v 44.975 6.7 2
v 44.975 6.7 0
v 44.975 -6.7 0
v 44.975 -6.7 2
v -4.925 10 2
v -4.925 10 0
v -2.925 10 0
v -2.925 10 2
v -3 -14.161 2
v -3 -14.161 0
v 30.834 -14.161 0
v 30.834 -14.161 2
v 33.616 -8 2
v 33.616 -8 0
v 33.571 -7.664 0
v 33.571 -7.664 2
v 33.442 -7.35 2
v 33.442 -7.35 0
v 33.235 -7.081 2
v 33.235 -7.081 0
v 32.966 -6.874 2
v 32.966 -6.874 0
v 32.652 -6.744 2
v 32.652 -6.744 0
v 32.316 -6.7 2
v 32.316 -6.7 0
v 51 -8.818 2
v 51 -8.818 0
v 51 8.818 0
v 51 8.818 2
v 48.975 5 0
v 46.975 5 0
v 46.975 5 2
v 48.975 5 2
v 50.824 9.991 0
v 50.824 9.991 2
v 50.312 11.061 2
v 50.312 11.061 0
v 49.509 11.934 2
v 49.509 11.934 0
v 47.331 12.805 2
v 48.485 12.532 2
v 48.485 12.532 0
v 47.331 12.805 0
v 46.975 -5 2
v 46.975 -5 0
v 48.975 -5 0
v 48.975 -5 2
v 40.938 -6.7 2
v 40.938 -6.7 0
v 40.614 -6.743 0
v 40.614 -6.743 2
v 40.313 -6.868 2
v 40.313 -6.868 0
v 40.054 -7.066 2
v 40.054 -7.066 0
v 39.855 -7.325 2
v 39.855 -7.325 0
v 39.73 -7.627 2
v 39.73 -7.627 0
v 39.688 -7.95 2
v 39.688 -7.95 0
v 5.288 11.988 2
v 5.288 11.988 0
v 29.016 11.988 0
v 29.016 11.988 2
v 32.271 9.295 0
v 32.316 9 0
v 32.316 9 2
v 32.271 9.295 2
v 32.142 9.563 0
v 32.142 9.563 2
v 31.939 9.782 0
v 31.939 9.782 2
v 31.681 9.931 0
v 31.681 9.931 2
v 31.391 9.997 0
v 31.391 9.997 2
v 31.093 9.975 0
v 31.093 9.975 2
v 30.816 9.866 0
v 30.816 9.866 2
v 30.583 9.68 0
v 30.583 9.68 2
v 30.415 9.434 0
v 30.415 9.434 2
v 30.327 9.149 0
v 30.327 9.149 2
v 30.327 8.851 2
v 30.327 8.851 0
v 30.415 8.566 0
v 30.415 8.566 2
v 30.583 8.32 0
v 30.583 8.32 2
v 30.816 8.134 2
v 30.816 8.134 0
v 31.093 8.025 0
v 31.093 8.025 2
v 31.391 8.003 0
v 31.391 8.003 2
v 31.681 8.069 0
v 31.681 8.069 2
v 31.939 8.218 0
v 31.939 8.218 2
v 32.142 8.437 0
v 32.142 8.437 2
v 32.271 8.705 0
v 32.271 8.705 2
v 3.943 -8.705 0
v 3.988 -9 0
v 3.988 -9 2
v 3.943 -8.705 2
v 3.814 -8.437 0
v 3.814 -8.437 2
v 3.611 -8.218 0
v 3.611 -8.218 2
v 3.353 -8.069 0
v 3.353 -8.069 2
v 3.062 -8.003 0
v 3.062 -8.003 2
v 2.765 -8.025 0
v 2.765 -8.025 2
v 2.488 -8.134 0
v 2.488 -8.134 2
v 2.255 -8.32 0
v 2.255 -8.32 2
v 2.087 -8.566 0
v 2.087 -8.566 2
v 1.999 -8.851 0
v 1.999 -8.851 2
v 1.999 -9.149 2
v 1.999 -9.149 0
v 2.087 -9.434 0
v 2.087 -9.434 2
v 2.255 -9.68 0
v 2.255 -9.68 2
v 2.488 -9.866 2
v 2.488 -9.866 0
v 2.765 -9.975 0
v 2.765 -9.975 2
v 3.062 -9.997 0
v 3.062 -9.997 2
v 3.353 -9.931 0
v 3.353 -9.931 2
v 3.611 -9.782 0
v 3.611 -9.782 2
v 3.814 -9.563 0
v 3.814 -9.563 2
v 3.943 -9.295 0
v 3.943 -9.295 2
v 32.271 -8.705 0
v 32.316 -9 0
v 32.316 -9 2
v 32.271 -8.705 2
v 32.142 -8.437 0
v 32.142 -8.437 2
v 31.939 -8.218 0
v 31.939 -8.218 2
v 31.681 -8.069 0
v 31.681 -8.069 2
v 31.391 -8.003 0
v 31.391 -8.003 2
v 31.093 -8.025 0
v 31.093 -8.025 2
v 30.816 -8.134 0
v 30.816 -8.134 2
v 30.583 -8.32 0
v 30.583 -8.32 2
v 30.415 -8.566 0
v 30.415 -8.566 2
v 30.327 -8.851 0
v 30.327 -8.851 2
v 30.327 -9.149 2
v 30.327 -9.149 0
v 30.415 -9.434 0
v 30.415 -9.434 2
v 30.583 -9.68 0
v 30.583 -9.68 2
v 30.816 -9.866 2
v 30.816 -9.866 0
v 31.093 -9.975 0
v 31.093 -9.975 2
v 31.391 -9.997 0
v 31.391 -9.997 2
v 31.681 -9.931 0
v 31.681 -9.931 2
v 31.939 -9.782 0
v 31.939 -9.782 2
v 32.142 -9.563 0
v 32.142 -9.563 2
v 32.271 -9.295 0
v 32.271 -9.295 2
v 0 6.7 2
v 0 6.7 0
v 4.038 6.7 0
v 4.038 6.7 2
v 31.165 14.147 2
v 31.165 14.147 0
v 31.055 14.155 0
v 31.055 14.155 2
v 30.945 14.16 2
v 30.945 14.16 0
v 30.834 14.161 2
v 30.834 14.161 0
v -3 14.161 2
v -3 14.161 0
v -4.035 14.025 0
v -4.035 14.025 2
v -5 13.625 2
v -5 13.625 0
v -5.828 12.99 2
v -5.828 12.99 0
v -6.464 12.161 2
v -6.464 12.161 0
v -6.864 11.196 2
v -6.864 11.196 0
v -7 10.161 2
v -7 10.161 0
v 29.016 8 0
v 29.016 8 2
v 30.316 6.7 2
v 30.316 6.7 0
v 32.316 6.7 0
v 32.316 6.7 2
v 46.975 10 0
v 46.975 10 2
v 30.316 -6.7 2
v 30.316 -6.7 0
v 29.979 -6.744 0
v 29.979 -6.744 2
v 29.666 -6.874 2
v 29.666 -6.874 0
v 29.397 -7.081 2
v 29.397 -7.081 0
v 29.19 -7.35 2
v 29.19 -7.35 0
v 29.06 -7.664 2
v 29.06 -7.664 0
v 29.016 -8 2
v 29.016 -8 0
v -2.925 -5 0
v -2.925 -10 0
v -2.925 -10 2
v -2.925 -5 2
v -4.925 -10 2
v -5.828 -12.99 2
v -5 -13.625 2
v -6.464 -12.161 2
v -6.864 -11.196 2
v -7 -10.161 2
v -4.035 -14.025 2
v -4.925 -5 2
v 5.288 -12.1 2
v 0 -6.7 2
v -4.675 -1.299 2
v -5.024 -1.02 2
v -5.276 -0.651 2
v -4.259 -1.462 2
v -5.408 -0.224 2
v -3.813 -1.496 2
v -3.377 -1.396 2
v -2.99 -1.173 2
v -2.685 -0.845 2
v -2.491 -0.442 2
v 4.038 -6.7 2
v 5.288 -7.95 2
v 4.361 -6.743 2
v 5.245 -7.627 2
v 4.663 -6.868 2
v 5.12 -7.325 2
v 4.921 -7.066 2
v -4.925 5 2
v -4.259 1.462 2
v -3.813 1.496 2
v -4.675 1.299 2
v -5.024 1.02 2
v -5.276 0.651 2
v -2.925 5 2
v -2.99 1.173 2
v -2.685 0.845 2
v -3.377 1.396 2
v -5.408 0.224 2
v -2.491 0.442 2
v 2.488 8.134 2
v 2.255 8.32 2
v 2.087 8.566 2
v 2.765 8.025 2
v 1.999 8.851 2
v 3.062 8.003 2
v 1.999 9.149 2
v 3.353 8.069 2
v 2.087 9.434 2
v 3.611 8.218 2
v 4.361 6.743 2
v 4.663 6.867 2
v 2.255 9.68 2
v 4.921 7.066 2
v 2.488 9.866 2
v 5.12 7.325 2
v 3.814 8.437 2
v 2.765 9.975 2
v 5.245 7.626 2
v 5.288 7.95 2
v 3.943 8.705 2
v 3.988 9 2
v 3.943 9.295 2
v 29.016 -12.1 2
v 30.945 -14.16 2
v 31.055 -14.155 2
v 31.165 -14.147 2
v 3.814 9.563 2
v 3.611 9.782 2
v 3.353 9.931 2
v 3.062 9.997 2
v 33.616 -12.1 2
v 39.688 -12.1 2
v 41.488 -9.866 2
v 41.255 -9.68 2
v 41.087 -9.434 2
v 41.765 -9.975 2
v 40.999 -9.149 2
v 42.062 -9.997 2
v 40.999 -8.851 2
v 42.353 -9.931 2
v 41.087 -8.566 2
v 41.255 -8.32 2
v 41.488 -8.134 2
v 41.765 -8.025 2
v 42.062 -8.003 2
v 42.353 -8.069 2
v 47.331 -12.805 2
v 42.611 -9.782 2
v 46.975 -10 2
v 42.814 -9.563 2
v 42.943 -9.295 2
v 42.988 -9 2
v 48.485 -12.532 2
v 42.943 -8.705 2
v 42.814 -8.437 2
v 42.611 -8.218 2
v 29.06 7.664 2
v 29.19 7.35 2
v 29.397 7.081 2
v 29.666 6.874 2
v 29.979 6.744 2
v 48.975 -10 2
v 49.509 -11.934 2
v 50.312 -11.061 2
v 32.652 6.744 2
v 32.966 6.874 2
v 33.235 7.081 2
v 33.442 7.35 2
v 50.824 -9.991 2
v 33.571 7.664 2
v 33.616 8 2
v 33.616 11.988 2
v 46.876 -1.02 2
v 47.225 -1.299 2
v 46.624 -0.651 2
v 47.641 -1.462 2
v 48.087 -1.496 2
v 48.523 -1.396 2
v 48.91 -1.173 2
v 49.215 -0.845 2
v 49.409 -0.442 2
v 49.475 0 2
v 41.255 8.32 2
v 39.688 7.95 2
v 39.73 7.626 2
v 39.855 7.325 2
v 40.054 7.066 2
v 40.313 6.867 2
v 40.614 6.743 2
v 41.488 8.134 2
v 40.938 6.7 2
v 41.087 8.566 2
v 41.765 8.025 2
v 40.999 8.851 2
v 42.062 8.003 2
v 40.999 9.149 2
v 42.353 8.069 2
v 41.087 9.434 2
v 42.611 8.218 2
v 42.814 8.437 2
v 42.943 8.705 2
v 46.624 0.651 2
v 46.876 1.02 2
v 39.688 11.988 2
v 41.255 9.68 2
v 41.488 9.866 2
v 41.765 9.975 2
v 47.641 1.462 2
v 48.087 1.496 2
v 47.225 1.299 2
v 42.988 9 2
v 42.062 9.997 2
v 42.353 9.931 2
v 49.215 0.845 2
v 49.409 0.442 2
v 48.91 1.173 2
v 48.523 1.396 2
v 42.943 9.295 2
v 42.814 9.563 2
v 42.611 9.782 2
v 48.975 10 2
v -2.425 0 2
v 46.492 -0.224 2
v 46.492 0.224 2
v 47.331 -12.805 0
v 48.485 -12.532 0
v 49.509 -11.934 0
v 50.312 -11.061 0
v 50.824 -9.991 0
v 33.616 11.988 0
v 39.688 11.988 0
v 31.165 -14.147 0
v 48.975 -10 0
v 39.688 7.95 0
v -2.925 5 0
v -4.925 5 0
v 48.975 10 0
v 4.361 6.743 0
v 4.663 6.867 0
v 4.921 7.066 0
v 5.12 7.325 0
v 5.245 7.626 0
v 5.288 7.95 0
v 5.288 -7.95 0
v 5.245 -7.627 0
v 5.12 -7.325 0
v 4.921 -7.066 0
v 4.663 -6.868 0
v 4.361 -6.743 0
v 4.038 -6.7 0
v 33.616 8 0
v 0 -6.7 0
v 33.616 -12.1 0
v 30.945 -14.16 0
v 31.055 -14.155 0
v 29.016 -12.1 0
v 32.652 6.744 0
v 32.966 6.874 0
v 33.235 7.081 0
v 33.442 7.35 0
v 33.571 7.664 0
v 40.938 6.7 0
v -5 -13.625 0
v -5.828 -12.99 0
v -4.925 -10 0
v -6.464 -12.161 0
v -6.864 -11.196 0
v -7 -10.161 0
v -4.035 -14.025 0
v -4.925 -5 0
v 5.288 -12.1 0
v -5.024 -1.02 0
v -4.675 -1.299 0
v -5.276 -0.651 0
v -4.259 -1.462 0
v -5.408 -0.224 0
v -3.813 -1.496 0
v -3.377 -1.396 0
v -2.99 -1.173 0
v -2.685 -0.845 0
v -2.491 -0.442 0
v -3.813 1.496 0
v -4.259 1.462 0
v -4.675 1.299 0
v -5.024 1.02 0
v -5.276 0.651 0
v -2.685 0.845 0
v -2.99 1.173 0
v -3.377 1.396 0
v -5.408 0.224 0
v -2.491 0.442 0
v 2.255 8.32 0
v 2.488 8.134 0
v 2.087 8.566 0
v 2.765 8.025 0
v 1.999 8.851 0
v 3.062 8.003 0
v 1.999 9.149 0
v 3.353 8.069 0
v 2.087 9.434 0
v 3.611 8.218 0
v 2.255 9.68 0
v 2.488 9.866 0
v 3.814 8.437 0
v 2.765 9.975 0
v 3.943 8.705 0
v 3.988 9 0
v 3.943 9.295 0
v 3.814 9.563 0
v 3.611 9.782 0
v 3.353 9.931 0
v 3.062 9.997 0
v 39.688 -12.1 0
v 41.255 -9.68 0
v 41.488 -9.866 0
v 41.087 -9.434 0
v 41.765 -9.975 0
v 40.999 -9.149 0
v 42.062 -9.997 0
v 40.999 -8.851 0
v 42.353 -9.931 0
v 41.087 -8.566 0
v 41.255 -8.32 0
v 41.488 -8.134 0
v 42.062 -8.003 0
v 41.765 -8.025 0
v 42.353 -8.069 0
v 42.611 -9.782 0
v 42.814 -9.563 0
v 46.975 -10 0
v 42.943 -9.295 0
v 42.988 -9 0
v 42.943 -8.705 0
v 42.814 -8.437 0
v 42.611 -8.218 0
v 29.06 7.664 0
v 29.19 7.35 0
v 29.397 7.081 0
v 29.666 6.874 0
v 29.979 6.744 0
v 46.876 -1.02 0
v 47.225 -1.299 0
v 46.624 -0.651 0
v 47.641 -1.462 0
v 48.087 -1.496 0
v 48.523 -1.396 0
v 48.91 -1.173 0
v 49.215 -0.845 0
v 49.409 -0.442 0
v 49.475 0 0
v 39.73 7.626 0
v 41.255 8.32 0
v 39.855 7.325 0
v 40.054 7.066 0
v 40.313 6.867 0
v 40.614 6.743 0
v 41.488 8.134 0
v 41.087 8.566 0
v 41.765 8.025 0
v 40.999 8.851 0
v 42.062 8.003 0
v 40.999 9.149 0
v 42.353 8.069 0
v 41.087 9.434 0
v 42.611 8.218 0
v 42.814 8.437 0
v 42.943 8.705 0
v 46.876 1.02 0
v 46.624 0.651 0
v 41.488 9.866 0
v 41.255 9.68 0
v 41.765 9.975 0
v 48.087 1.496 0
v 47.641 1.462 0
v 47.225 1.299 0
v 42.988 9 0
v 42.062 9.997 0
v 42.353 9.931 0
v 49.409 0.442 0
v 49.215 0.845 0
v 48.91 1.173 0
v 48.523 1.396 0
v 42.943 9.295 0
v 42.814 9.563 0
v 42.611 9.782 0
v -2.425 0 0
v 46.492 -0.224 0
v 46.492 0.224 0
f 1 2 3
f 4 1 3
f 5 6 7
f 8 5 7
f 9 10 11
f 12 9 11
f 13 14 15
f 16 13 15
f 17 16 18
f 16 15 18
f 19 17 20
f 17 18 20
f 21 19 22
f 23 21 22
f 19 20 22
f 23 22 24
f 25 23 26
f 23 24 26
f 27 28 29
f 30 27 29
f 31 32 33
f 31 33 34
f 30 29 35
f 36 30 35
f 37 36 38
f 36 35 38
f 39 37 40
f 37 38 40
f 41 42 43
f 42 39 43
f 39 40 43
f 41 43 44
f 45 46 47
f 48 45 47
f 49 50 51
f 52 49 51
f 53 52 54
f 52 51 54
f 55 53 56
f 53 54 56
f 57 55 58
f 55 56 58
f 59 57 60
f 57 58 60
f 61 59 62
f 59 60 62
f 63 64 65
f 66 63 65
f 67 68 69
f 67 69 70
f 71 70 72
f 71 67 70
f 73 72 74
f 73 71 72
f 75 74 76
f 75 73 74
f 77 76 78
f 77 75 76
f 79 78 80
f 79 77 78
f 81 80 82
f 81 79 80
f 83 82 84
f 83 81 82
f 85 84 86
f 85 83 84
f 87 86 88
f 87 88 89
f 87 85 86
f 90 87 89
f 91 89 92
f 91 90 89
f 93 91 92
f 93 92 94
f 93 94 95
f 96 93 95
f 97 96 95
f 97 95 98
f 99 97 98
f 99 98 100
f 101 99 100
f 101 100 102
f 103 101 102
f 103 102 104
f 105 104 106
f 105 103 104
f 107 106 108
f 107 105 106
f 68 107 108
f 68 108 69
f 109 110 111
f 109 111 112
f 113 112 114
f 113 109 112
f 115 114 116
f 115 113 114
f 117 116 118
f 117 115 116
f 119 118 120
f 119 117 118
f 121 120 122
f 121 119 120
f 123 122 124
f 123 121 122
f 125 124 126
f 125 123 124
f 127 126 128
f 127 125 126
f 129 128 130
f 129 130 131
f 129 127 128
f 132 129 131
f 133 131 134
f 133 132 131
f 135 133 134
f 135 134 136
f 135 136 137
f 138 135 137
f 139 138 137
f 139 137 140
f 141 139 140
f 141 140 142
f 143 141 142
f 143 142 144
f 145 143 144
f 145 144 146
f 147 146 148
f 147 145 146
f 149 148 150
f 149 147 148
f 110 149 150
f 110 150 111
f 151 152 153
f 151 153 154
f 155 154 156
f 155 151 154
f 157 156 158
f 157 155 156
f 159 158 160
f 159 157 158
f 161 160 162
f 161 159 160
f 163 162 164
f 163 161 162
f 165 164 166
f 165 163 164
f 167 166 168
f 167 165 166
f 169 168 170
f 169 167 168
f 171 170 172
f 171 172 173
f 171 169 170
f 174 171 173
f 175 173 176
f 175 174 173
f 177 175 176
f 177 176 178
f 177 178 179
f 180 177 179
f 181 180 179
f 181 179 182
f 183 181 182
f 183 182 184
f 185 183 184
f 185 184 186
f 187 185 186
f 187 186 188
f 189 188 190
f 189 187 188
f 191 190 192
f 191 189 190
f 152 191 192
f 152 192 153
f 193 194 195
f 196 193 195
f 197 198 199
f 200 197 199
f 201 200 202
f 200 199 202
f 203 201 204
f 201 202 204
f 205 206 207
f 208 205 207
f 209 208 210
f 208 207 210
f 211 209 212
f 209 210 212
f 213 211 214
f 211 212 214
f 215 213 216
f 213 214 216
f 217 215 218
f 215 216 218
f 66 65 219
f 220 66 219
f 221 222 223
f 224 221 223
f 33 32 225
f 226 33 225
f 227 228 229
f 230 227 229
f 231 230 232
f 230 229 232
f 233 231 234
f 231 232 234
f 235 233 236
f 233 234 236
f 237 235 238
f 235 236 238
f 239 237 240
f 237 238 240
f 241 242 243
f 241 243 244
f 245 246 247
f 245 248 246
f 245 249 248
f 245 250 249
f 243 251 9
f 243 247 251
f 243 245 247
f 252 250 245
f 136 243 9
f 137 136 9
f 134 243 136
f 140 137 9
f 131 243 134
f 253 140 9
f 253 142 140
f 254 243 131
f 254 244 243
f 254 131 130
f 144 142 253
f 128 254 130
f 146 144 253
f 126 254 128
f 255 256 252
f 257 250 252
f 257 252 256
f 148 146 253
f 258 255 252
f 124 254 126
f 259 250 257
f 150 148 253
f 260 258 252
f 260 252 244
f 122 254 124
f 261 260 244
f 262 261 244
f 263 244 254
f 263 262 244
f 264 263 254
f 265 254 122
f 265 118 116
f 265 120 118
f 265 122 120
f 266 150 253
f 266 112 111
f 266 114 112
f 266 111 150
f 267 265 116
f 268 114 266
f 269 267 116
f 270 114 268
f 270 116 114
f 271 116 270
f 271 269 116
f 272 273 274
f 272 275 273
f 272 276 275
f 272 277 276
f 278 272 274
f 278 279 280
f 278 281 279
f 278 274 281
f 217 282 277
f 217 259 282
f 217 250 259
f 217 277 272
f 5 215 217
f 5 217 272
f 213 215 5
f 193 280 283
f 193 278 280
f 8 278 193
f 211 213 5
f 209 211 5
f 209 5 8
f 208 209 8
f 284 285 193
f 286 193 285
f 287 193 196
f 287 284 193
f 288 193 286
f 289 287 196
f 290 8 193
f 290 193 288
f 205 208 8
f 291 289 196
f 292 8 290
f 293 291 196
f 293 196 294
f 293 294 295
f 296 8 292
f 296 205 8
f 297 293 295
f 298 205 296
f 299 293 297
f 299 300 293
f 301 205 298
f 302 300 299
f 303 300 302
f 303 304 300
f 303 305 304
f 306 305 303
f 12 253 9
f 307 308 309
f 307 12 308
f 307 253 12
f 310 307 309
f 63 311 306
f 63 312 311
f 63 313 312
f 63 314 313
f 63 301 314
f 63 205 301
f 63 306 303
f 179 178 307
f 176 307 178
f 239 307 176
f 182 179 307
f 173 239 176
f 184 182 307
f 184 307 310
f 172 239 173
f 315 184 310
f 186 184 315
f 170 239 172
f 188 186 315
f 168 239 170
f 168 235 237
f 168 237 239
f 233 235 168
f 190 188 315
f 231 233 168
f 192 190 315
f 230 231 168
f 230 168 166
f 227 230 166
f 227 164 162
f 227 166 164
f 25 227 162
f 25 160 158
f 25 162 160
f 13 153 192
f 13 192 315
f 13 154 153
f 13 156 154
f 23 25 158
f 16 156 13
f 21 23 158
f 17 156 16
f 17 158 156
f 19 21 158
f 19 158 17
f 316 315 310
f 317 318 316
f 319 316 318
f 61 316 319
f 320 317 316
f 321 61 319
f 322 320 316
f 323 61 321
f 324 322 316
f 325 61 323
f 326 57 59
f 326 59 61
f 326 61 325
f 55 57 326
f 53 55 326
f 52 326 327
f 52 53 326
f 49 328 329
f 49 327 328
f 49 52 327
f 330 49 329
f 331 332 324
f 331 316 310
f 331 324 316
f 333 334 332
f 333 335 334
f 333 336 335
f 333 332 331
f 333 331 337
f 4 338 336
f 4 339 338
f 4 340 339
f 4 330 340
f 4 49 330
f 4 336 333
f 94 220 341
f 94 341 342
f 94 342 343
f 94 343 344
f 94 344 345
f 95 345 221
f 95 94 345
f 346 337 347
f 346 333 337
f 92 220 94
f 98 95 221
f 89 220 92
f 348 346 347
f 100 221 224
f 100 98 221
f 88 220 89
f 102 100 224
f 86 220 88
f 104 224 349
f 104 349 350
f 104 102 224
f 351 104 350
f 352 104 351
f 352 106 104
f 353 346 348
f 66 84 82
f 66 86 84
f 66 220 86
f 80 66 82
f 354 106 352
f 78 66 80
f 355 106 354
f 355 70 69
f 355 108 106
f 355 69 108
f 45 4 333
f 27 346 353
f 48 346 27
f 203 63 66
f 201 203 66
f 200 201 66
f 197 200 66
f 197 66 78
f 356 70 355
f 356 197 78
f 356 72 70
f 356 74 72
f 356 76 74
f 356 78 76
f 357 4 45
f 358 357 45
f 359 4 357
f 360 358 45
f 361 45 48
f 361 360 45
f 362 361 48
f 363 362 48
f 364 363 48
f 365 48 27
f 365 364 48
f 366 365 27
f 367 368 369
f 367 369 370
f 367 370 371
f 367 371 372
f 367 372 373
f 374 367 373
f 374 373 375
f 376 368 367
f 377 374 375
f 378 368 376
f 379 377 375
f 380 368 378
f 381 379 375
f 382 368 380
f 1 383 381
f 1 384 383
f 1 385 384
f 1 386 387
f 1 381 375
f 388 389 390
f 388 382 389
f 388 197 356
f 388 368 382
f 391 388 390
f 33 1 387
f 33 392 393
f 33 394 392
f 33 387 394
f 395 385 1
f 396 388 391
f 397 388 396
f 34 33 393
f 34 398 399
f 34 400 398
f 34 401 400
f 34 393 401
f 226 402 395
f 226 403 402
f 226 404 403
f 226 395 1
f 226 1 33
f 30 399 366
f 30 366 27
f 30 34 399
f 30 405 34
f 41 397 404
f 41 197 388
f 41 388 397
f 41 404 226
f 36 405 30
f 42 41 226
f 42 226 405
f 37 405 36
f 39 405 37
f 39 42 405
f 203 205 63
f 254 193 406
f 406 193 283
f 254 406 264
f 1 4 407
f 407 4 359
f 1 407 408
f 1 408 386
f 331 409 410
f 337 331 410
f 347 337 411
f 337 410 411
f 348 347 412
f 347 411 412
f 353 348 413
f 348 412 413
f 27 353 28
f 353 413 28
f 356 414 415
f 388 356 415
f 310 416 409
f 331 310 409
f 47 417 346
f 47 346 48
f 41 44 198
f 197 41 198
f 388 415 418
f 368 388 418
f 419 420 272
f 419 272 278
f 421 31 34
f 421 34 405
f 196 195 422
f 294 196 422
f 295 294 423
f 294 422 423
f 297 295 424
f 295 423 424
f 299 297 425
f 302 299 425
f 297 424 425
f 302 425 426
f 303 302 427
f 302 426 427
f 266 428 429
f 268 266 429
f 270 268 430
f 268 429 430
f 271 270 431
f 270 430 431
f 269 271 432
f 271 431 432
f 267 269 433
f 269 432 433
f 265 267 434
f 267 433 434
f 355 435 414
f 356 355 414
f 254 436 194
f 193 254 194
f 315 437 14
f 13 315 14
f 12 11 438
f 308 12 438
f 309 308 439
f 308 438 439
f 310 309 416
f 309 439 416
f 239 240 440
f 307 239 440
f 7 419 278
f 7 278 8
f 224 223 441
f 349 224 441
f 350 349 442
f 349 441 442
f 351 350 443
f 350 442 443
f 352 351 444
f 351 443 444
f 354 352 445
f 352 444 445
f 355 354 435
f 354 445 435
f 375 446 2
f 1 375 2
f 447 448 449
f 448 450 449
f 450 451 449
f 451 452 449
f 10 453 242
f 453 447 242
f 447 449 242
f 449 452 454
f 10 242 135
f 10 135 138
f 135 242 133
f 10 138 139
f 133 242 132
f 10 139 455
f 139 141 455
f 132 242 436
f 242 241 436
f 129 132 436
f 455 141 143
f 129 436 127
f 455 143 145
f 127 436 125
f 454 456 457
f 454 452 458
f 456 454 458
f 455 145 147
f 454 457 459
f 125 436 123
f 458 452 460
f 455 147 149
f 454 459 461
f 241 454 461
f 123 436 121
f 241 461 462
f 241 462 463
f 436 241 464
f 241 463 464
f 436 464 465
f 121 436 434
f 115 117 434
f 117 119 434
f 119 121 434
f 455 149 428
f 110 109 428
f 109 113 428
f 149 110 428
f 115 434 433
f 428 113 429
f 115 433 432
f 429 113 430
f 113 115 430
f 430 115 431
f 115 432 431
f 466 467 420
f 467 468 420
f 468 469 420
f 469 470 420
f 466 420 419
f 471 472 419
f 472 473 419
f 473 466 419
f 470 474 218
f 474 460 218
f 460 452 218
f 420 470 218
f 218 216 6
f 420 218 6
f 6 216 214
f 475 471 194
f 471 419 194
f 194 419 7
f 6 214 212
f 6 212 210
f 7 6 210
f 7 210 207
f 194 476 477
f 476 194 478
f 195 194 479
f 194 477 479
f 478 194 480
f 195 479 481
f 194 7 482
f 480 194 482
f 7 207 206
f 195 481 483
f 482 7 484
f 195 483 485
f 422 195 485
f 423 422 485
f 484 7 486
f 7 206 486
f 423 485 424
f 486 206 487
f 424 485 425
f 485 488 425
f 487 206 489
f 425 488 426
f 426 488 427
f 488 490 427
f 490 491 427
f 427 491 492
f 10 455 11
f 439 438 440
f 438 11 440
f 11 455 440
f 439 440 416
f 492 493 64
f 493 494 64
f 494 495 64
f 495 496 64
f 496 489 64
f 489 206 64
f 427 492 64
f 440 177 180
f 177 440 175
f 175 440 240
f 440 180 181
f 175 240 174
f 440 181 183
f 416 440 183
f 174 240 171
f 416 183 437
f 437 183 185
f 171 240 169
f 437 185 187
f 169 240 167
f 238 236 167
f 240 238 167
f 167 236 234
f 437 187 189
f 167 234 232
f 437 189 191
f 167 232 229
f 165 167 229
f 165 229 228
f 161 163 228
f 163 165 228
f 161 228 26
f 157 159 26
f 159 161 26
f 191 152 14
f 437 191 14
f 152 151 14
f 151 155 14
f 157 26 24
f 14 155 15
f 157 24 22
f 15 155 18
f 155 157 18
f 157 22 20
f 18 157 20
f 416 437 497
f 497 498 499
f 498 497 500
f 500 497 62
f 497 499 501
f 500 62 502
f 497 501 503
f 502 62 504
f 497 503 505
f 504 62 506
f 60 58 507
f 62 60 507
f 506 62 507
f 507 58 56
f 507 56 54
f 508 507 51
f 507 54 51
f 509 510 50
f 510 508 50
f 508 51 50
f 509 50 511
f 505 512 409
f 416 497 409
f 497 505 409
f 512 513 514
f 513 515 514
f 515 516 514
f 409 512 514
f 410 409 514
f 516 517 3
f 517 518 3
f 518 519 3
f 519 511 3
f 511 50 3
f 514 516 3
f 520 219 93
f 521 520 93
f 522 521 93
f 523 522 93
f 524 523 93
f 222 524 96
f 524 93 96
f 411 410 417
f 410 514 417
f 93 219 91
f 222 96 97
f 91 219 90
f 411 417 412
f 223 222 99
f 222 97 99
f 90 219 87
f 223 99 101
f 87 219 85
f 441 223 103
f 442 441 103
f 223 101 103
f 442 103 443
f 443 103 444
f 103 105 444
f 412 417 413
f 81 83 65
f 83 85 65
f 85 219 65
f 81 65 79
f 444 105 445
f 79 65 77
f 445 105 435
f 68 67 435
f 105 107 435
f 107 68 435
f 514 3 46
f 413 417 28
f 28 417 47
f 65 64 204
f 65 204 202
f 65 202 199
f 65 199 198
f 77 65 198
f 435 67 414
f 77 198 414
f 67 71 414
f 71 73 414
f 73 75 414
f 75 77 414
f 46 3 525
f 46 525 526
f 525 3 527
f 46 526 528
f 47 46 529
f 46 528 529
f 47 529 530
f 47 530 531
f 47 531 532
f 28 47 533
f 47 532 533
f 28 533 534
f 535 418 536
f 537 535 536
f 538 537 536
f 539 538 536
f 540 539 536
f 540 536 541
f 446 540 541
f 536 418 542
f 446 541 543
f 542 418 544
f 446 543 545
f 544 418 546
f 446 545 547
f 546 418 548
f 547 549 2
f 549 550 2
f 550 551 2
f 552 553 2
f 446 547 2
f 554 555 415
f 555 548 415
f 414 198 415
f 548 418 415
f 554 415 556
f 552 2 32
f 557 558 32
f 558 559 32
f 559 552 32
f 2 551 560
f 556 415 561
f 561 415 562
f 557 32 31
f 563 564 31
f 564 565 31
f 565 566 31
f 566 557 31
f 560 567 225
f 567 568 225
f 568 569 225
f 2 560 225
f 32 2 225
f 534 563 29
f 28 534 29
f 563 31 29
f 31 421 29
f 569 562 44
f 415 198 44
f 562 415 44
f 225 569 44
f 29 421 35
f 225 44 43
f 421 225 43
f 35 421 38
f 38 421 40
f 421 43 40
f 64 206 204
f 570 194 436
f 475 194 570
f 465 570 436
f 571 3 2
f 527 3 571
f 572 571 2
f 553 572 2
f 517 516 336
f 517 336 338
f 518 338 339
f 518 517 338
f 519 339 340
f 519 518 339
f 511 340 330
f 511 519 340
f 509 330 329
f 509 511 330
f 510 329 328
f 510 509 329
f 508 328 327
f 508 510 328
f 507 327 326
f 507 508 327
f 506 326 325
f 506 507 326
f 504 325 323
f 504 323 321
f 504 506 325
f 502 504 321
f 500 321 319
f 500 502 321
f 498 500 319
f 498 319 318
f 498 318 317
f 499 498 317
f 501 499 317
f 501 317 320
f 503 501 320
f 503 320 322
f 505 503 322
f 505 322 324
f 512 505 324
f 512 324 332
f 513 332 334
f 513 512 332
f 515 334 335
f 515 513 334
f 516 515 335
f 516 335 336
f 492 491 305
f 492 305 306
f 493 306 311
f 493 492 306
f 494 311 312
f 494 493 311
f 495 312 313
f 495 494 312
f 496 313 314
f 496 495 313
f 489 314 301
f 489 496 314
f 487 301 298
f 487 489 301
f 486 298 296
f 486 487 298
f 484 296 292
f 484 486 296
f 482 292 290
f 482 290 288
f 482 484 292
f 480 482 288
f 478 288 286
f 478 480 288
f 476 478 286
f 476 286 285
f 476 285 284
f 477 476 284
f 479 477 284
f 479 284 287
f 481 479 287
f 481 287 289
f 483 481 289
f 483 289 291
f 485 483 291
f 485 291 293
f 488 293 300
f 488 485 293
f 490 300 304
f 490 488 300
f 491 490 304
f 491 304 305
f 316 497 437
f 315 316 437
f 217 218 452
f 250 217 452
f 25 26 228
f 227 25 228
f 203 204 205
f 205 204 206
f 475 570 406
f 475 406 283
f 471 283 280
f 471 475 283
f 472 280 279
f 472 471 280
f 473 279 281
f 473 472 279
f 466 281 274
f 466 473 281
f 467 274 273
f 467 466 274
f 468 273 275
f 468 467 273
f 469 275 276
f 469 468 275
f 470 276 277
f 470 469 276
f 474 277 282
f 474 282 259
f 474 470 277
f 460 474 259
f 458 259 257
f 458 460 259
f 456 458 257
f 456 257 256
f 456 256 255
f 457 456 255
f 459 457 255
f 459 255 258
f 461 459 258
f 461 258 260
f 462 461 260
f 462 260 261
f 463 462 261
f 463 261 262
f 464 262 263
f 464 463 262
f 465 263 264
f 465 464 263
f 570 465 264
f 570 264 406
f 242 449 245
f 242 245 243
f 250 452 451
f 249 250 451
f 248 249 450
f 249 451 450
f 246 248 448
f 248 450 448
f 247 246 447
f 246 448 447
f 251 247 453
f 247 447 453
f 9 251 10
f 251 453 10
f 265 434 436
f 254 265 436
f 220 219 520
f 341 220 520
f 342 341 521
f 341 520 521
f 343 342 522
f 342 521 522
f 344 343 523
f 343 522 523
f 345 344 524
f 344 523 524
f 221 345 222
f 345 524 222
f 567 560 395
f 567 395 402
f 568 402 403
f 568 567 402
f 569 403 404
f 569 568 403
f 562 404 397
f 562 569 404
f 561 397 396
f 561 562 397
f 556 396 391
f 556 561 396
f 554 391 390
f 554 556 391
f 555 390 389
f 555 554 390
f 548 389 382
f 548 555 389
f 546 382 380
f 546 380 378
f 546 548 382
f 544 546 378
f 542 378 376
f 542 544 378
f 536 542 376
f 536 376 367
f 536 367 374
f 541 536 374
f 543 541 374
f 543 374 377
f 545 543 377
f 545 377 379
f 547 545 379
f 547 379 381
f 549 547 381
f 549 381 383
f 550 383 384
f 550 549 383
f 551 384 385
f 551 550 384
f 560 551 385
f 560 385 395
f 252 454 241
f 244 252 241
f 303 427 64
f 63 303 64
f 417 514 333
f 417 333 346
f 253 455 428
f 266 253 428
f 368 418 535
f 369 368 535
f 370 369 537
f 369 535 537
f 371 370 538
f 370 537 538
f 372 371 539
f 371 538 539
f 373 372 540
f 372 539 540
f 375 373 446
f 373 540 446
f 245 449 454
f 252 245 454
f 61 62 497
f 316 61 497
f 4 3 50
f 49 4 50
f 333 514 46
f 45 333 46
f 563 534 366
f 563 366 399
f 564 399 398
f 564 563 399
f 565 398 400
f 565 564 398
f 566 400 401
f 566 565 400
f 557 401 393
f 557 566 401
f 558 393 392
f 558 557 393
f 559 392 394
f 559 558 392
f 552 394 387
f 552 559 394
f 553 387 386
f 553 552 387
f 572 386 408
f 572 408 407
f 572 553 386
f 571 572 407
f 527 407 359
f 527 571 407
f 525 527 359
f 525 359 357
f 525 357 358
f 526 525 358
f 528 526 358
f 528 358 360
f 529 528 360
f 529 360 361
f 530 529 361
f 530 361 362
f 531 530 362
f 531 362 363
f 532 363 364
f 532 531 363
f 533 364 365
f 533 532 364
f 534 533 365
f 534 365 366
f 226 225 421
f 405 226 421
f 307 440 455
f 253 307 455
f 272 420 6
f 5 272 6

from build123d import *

# Parameters (mm, degrees)
BOSS_EXTRU_1_OUTLINE_W   = 2
BOSS_EXTRU_1_OUTLINE_H   = 5
BOSS_EXTRU_1_OUTLINE_R   = 1
BOSS_EXTRU_1_OUTLINE_R_2 = 1.5
BOSS_EXTRU_1_DEPTH       = 2
FILLET1_R                = 4


# Read off the part's stored shape, not the designer's step: Boss.-Extru.1
with BuildPart() as part:
    # Boss.-Extru.1 outline → Boss.-Extru.1 (new body)
    with BuildSketch(Plane.XY):
        Polygon((-7, -14.16114291), (31, -14.16114291), (51, -12.5), (51, 12.5), (31, 14.16114291), (-7, 14.16114291), align=None)
        with Locations((-3.924802108, -7.5)):
            Rectangle(BOSS_EXTRU_1_OUTLINE_W, BOSS_EXTRU_1_OUTLINE_H, mode=Mode.SUBTRACT)
        with Locations((2.98759897, -9.000034515)):
            Circle(BOSS_EXTRU_1_OUTLINE_R, mode=Mode.SUBTRACT)
        with Locations((31.315776387, -9.000034515)):
            Circle(BOSS_EXTRU_1_OUTLINE_R, mode=Mode.SUBTRACT)
        with Locations((41.98759897, -9.000034515)):
            Circle(BOSS_EXTRU_1_OUTLINE_R, mode=Mode.SUBTRACT)
        with Locations((47.975197892, -7.5)):
            Rectangle(BOSS_EXTRU_1_OUTLINE_W, BOSS_EXTRU_1_OUTLINE_H, mode=Mode.SUBTRACT)
        with BuildLine():
            ThreePointArc((33.615776345, -8.000034132), (33.23501504, -7.080795537), (32.315776344, -6.700034473))
            Line((32.315776344, -6.700034473), (30.315776345, -6.700034473))
            ThreePointArc((30.315776345, -6.700034473), (29.396536008, -7.080797161), (29.015776303, -8.000038733))
            Line((29.015776303, -8.000038733), (29.015776303, -12.100034515))
            Line((29.015776303, -12.100034515), (5.28759897, -12.100034515))
            Line((5.28759897, -12.100034515), (5.28759897, -7.950034515))
            ThreePointArc((5.28759897, -7.950034515), (4.921479782, -7.066148374), (4.037591434, -6.700034515))
            Line((4.037591434, -6.700034515), (0, -6.699965485))
            Line((0, -6.699965485), (0, 6.699965485))
            Line((0, 6.699965485), (4.03758425, 6.699965485))
            ThreePointArc((4.03758425, 6.699965485), (4.921477242, 7.066076805), (5.28759897, 7.949965485))
            Line((5.28759897, 7.949965485), (5.28759897, 11.987564455))
            Line((5.28759897, 11.987564455), (29.015776399, 11.987564455))
            Line((29.015776399, 11.987564455), (29.015776399, 7.999965373))
            ThreePointArc((29.015776399, 7.999965373), (29.396537621, 7.080726637), (30.31577639, 6.699965495))
            Line((30.31577639, 6.699965495), (32.315776389, 6.699965495))
            ThreePointArc((32.315776389, 6.699965495), (33.235016597, 7.080728053), (33.615776432, 7.999969389))
            Line((33.615776432, 7.999969389), (33.615776432, 11.987564455))
            Line((33.615776432, 11.987564455), (39.68759897, 11.987564455))
            Line((39.68759897, 11.987564455), (39.68759897, 7.949965701))
            ThreePointArc((39.68759897, 7.949965701), (40.053716981, 7.066080502), (40.9376034, 6.699965437))
            Line((40.9376034, 6.699965437), (44.975197892, 6.699965437))
            Line((44.975197892, 6.699965437), (44.975197892, -6.70003437))
            Line((44.975197892, -6.70003437), (40.937599481, -6.70003437))
            ThreePointArc((40.937599481, -6.70003437), (40.053713738, -7.066152541), (39.687598777, -7.950039613))
            Line((39.687598777, -7.950039613), (39.687598777, -12.100034515))
            Line((39.687598777, -12.100034515), (33.615776345, -12.100034515))
            Line((33.615776345, -12.100034515), (33.615776345, -8.000034132))
        make_face(mode=Mode.SUBTRACT)
        with Locations((-3.924802108, 0)):
            Circle(BOSS_EXTRU_1_OUTLINE_R_2, mode=Mode.SUBTRACT)
        with Locations((-3.924802108, 7.5)):
            Rectangle(BOSS_EXTRU_1_OUTLINE_W, BOSS_EXTRU_1_OUTLINE_H, mode=Mode.SUBTRACT)
        with Locations((2.98759897, 8.999965485)):
            Circle(BOSS_EXTRU_1_OUTLINE_R, mode=Mode.SUBTRACT)
        with Locations((47.975197892, 0)):
            Circle(BOSS_EXTRU_1_OUTLINE_R_2, mode=Mode.SUBTRACT)
        with Locations((31.315776387, 8.999965485)):
            Circle(BOSS_EXTRU_1_OUTLINE_R, mode=Mode.SUBTRACT)
        with Locations((41.98759897, 8.999965485)):
            Circle(BOSS_EXTRU_1_OUTLINE_R, mode=Mode.SUBTRACT)
        with Locations((47.975197892, 7.5)):
            Rectangle(BOSS_EXTRU_1_OUTLINE_W, BOSS_EXTRU_1_OUTLINE_H, mode=Mode.SUBTRACT)
    extrude(amount=BOSS_EXTRU_1_DEPTH)

    # Fillet1
    # the kernel refuses this fillet: 4 mm, written as the material it takes off along each edge
    with BuildSketch(Plane(origin=(31, -14.16114291, -0.414571976), x_dir=(-1, 0, 0), z_dir=(0, 0, 1)), Plane(origin=(31, 14.16114291, -0.414571976), x_dir=(0.9965684992480803, -0.0827721348427634, 0), z_dir=(0, 0, 1))) as fillet1_piece_1:
        with BuildLine():
            CenterArc((FILLET1_R * 0.0414571976238, -FILLET1_R), FILLET1_R, 90, 4.747926068)
            Line((-FILLET1_R * 0.041314937219, -FILLET1_R * 0.00343150075192), (0, 0))
            Line((0, 0), (FILLET1_R * 0.0414571976238, 0))
        make_face()
    extrude(amount=2.829143952, mode=Mode.SUBTRACT)
    with BuildSketch(Plane(origin=(-7, -14.16114291, -10), x_dir=(1, 0, 0), z_dir=(0, 0, 1))) as fillet1_piece_2:
        with BuildLine():
            CenterArc((FILLET1_R, FILLET1_R), FILLET1_R, 180, 90)
            Line((0, FILLET1_R), (0, 0))
            Line((0, 0), (FILLET1_R, 0))
        make_face()
    extrude(amount=22, mode=Mode.SUBTRACT)
    with BuildSketch(Plane(origin=(-7, 14.16114291, -10), x_dir=(1, 0, 0), z_dir=(0, 0, 1))) as fillet1_piece_3:
        with BuildLine():
            CenterArc((FILLET1_R, -FILLET1_R), FILLET1_R, 90, 90)
            Line((0, -FILLET1_R), (0, 0))
            Line((0, 0), (FILLET1_R, 0))
        make_face()
    extrude(amount=22, mode=Mode.SUBTRACT)
    with BuildSketch(Plane(origin=(51, 12.5, -9.20386171), x_dir=(0, -1, 0), z_dir=(0, 0, 1)), Plane(origin=(51, -12.5, -9.20386171), x_dir=(-0.9965684992480804, -0.08277213484276448, 0), z_dir=(0, 0, 1))) as fillet1_piece_4:
        with BuildLine():
            CenterArc((FILLET1_R * 0.920386170995, -FILLET1_R), FILLET1_R, 90, 85.252073932)
            Line((-FILLET1_R * 0.076182328253, -FILLET1_R * 0.917227865157), (0, 0))
            Line((0, 0), (FILLET1_R * 0.920386170995, 0))
        make_face()
    extrude(amount=20.40772342, mode=Mode.SUBTRACT)


solid = part.part
